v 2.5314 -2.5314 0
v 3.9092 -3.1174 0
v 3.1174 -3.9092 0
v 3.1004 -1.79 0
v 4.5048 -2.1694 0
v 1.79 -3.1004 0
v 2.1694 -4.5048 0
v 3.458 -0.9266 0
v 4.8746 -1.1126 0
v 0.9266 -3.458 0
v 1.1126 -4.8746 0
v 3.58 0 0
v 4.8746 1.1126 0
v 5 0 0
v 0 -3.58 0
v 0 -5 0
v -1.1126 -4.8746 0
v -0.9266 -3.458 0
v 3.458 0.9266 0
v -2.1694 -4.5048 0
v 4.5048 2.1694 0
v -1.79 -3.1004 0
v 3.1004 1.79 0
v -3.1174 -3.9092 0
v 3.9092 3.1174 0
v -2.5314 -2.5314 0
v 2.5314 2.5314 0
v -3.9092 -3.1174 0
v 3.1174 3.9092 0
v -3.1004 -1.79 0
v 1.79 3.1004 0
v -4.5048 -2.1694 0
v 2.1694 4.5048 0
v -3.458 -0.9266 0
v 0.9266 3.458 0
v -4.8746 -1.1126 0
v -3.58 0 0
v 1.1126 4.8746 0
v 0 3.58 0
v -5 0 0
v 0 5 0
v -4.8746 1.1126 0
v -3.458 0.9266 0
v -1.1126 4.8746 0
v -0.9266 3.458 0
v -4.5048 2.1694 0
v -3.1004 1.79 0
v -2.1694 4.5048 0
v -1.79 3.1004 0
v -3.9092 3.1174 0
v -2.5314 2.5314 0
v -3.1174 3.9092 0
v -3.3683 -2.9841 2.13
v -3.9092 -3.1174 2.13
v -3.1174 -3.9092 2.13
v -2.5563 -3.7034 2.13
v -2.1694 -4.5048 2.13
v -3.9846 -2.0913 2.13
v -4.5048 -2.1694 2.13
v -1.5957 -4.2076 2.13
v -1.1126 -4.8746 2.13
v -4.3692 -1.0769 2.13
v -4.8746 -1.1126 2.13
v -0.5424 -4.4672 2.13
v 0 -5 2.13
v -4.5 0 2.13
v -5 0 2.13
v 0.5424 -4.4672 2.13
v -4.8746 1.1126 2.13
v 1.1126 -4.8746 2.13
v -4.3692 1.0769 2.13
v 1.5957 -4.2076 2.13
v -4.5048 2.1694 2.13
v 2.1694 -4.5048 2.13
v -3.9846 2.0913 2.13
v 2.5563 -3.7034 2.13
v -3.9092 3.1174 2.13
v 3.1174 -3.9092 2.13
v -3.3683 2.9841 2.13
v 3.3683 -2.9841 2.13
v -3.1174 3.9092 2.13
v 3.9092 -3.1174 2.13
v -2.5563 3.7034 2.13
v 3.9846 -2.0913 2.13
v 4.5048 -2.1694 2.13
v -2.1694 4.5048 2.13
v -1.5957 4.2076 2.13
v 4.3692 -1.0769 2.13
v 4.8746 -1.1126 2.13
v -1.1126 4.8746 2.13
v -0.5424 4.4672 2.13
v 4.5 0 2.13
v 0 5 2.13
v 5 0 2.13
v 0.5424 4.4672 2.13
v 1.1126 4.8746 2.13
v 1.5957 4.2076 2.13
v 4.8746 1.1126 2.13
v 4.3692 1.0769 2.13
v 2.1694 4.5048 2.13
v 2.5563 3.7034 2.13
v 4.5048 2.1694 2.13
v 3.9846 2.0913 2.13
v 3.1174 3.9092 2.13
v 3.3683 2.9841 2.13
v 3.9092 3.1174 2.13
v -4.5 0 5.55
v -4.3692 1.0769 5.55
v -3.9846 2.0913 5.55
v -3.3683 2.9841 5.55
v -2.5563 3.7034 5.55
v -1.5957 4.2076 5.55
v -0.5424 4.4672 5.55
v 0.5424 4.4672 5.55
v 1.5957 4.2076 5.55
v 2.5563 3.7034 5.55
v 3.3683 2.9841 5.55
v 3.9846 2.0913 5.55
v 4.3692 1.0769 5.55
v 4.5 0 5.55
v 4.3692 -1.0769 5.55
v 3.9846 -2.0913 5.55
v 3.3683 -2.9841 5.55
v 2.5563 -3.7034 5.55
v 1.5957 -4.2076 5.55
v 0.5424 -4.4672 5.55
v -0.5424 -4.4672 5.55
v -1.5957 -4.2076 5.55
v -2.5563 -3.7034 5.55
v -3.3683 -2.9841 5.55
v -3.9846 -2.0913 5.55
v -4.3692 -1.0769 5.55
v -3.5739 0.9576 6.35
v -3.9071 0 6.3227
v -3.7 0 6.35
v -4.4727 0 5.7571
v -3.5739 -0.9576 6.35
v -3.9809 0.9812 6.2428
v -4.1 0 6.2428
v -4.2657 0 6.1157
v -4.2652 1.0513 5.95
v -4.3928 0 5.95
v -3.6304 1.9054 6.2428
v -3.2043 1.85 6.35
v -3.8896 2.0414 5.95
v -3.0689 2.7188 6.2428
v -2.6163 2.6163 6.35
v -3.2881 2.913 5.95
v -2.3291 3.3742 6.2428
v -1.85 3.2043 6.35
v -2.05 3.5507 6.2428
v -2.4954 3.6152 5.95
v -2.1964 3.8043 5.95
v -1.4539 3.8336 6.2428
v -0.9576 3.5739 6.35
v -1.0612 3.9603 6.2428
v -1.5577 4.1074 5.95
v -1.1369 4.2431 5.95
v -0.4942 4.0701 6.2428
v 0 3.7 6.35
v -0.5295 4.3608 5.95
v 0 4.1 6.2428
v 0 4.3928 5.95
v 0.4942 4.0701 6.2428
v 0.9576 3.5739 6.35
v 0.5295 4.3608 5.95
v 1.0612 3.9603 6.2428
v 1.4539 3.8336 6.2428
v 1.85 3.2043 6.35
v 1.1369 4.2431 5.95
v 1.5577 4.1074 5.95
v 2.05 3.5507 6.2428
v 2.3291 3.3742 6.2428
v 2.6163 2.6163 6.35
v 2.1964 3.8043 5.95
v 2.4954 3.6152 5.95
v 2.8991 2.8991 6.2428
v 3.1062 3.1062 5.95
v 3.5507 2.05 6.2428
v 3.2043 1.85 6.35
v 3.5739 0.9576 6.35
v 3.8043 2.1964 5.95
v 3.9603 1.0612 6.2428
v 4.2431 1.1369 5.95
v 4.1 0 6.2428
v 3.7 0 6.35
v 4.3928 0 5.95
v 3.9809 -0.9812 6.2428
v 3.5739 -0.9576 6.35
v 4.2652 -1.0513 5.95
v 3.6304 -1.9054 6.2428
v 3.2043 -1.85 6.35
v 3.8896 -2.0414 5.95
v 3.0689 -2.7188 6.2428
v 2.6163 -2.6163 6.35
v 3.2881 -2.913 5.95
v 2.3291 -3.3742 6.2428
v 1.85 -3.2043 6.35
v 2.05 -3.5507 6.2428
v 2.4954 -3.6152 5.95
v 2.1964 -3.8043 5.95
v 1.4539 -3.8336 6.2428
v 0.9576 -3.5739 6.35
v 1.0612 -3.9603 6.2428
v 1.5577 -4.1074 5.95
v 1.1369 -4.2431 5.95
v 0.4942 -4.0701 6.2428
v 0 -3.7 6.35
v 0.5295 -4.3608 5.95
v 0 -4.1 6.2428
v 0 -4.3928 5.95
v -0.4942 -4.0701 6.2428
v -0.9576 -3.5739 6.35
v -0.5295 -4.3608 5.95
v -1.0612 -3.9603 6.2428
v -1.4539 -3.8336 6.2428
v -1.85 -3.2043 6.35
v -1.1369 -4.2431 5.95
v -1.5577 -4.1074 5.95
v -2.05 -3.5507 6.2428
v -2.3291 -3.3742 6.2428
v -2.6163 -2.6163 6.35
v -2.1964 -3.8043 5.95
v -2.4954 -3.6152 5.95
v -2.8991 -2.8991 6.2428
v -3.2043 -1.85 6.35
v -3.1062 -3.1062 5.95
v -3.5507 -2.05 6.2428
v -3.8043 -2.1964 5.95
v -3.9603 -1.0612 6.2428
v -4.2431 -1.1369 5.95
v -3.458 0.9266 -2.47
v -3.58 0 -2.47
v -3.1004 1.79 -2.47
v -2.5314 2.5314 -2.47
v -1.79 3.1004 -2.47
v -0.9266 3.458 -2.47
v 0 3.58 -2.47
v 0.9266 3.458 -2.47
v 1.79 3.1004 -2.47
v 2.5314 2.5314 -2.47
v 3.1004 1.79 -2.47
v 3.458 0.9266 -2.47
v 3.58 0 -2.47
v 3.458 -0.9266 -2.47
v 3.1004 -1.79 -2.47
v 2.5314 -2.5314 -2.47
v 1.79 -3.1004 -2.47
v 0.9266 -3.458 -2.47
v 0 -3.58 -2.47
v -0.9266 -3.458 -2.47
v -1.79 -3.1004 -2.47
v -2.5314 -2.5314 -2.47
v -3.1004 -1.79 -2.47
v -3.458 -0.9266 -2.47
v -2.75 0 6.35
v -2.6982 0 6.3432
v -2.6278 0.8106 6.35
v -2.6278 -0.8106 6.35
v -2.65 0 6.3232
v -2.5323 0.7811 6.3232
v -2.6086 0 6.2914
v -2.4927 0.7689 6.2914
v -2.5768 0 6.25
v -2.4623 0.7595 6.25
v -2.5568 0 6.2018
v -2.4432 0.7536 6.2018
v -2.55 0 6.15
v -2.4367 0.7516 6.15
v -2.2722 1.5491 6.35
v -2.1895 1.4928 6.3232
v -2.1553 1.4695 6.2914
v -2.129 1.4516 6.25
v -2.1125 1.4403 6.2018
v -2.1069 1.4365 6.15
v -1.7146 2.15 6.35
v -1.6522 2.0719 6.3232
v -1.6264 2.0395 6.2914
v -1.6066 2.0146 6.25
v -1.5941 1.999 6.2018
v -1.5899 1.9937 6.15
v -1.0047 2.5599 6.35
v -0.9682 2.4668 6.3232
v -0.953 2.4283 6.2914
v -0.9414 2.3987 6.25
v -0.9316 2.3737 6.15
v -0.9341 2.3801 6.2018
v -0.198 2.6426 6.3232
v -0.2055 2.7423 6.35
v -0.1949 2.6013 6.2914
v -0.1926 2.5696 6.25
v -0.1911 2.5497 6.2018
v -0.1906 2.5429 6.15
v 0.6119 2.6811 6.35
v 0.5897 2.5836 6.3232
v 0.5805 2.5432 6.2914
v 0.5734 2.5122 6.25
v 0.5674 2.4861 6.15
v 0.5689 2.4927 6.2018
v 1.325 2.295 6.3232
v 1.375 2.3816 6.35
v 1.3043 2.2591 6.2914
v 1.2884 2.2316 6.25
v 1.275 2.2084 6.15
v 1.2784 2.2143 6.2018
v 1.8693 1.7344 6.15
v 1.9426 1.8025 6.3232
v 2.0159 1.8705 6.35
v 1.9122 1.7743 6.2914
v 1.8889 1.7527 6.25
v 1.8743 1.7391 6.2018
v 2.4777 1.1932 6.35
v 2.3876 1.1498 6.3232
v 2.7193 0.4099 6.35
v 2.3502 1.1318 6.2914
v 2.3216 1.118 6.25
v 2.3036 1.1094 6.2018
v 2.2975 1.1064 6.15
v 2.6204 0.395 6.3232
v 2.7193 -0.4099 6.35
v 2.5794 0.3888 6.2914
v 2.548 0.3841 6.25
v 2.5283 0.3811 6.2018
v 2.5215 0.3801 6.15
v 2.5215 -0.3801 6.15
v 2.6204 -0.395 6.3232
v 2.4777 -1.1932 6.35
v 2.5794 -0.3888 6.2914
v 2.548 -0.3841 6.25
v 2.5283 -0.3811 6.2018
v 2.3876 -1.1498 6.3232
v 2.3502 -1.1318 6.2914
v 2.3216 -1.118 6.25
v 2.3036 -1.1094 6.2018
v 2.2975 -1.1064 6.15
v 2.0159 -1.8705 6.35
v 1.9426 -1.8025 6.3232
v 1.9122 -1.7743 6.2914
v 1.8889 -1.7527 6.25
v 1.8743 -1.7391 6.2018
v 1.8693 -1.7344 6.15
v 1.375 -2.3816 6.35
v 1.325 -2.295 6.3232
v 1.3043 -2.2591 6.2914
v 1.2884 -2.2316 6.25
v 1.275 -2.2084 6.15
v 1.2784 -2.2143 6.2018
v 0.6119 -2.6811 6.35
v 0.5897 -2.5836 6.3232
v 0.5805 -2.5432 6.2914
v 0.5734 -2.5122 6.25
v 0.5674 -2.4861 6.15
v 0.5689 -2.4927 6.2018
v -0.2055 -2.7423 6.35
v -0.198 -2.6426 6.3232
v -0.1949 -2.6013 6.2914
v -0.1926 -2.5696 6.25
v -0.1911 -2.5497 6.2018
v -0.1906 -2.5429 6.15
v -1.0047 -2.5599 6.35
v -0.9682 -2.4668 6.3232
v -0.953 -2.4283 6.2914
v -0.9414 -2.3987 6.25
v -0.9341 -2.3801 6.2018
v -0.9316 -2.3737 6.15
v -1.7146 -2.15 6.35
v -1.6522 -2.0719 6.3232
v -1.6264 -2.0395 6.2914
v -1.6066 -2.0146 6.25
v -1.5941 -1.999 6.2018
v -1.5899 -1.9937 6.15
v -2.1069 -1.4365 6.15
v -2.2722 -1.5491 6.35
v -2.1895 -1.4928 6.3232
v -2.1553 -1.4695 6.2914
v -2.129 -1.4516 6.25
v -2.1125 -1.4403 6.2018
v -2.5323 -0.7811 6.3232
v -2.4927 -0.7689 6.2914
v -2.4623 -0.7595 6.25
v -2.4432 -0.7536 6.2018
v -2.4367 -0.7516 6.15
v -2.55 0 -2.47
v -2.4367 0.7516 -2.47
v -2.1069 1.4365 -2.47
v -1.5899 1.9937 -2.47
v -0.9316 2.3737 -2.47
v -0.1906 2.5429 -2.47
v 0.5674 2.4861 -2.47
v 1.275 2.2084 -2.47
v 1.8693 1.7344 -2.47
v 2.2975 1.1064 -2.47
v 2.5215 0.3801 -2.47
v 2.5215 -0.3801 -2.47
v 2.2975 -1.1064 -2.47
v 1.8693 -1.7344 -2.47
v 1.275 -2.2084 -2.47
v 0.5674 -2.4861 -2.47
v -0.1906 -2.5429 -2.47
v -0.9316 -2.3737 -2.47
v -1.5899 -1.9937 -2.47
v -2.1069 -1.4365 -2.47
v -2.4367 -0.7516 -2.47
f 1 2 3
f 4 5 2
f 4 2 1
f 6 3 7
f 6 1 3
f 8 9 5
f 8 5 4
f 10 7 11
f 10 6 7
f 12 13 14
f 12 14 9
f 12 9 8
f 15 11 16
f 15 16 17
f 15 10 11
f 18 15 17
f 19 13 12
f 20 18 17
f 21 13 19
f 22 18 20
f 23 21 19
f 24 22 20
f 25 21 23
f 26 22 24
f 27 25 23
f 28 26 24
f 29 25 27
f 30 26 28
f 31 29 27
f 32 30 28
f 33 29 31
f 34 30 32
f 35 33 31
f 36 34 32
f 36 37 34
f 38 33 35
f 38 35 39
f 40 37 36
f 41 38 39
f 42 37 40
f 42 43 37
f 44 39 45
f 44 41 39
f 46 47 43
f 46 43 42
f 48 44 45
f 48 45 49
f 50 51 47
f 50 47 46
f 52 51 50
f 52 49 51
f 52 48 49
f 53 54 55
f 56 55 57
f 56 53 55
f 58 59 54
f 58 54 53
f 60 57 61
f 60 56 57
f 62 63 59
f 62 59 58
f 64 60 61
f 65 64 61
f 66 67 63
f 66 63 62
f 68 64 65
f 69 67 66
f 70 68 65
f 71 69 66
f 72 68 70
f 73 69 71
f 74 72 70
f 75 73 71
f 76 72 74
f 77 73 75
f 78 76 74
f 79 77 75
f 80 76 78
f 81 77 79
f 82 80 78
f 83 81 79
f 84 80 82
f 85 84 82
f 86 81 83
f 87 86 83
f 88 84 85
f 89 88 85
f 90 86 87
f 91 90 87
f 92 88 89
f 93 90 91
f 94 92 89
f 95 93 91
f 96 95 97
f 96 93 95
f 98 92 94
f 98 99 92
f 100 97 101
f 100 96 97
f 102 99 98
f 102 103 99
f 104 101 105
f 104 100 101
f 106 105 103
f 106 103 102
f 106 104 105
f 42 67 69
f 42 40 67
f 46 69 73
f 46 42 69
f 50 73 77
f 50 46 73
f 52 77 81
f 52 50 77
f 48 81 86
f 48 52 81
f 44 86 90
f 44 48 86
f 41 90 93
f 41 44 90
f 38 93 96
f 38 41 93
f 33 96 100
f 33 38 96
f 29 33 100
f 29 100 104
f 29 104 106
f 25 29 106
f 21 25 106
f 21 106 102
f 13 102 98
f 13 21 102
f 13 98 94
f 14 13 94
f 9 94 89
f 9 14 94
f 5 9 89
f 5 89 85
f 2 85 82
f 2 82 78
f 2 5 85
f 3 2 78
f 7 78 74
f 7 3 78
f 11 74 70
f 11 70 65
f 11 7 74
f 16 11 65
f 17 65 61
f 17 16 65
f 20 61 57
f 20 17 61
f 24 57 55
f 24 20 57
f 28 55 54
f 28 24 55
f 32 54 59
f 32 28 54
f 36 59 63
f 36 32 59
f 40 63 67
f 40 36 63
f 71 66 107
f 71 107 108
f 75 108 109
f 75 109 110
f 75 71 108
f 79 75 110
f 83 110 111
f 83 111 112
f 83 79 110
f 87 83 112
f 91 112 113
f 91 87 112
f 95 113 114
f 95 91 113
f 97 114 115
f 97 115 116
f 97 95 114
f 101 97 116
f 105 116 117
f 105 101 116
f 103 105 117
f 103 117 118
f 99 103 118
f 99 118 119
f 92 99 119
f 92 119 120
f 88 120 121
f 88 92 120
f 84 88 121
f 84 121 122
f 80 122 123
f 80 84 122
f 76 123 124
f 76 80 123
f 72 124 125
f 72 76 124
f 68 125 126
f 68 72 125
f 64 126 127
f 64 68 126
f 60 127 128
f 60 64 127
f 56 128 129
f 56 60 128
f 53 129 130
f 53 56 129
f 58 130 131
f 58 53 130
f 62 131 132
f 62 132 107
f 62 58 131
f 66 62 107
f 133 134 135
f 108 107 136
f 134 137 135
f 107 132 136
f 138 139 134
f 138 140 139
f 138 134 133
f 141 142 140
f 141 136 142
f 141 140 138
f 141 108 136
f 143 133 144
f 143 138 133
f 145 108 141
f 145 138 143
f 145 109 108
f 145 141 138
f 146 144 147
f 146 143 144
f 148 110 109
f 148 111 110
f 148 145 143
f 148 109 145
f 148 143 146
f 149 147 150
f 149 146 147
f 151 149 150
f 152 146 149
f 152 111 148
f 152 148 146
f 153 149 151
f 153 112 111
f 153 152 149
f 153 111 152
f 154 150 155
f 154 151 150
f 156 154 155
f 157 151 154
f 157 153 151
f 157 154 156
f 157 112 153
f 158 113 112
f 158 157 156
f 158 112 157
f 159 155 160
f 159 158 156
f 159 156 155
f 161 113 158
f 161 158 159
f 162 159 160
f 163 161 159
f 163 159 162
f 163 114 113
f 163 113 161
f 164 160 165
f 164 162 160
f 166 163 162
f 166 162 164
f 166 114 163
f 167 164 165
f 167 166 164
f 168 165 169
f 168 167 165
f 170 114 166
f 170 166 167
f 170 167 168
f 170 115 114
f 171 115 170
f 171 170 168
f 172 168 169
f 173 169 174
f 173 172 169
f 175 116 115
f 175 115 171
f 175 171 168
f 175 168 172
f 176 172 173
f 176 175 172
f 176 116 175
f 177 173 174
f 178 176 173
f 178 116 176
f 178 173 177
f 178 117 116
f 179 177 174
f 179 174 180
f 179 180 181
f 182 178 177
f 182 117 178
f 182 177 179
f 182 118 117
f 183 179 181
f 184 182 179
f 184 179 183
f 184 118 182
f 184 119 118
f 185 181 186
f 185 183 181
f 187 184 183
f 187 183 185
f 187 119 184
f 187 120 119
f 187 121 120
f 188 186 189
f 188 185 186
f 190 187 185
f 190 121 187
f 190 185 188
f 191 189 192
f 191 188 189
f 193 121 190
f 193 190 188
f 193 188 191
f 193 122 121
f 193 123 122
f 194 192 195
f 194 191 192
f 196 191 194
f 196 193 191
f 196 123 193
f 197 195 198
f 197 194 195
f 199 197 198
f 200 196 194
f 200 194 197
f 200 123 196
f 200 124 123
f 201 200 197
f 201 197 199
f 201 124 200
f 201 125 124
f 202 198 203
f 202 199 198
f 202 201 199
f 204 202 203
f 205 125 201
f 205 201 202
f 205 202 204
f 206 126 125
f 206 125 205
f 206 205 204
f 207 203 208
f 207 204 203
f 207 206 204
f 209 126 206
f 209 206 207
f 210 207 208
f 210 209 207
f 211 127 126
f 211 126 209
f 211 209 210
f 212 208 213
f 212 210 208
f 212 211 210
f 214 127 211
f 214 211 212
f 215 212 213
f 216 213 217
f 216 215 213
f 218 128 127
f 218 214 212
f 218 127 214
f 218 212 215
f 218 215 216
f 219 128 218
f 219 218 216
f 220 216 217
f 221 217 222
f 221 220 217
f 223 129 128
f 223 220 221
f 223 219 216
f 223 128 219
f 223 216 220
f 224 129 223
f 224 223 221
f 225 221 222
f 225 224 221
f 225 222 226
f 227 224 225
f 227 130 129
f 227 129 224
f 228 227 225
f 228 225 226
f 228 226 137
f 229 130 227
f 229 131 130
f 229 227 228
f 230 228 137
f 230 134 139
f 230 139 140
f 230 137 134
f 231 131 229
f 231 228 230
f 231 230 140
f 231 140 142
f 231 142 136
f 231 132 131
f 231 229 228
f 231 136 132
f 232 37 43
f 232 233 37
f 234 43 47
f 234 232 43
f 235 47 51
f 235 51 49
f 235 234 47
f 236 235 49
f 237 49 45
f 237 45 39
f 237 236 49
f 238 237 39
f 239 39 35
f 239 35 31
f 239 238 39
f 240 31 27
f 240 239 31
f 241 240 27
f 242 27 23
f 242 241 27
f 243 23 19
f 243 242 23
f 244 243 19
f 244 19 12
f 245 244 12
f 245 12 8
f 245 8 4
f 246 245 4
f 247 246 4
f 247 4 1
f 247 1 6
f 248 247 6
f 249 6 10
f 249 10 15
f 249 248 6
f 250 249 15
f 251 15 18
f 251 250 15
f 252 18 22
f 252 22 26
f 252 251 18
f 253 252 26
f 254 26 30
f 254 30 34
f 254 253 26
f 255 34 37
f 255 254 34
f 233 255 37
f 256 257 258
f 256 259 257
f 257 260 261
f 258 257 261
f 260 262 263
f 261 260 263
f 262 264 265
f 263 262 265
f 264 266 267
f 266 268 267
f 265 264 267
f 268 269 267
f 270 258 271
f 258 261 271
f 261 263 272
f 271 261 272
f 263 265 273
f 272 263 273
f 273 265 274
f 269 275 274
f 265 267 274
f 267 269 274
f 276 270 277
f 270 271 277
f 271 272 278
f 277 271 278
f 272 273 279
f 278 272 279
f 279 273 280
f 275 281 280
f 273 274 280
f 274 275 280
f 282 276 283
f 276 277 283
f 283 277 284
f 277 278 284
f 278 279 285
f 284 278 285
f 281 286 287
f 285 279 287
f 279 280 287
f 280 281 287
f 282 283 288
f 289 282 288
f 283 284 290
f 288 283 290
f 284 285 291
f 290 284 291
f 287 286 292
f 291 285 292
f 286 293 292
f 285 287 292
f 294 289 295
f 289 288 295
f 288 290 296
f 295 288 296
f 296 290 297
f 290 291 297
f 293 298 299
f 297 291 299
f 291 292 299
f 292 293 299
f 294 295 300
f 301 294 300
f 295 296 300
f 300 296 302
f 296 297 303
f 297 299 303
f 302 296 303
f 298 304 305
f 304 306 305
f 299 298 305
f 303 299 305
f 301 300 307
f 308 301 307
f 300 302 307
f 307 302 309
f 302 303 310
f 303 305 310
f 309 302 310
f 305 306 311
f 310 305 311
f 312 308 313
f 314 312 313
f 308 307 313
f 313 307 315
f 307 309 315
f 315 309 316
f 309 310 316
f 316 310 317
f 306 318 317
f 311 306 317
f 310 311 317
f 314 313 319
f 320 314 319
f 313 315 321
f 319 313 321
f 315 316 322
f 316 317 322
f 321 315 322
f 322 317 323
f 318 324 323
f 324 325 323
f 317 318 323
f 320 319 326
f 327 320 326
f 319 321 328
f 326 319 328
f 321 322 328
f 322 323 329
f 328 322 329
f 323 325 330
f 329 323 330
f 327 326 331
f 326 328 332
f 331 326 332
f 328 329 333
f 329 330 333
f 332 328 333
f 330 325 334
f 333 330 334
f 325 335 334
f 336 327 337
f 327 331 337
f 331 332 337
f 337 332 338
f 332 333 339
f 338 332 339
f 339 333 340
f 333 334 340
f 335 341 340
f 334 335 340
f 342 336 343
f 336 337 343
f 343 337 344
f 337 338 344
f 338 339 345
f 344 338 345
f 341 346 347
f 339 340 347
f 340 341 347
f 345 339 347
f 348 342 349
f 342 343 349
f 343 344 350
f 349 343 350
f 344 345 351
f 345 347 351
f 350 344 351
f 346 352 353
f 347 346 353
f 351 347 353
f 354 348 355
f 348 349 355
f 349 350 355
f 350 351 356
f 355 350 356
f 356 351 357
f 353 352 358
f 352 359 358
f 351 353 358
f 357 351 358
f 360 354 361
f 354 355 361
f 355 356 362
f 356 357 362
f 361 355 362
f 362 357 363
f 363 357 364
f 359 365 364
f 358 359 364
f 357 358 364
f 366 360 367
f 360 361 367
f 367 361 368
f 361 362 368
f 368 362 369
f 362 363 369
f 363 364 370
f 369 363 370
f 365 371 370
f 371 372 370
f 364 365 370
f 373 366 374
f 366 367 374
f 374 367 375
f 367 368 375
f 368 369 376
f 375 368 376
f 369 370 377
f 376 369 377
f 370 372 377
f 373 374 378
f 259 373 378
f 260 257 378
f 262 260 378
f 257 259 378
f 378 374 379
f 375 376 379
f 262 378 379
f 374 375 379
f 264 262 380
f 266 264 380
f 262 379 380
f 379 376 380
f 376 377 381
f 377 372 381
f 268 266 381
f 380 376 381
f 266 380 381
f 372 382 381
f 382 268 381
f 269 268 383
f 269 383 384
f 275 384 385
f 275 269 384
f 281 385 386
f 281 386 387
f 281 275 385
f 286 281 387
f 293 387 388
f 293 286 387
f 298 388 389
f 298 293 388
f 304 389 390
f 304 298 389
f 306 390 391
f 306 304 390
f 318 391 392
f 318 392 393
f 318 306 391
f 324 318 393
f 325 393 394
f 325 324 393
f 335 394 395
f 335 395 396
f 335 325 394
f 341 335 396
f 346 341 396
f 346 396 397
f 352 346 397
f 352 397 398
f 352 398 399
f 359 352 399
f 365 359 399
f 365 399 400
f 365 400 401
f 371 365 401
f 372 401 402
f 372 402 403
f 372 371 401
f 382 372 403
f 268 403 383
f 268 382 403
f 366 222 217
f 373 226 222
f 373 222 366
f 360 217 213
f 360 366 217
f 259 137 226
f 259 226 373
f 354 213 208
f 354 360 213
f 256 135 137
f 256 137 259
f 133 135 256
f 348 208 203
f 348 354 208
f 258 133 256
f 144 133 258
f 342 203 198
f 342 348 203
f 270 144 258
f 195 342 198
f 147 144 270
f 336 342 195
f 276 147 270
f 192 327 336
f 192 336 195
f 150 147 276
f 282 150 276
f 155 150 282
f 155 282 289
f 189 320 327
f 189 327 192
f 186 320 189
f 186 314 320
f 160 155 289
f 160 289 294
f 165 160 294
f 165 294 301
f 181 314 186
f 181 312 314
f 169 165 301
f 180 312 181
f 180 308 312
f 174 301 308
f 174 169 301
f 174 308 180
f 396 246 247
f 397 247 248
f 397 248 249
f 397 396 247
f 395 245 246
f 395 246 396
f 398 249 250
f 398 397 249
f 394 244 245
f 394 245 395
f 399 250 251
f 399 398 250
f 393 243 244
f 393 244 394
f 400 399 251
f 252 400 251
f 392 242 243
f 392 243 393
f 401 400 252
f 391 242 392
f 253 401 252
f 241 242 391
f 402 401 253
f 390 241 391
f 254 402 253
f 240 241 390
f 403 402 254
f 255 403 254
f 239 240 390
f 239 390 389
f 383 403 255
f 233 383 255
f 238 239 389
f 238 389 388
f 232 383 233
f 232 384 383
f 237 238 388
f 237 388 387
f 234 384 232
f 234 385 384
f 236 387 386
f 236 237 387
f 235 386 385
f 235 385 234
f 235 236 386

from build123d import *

# Parameters (mm, degrees)
F2_R = 0.8
F3_R = 0.2


with BuildPart() as f1:
    # F0 (on Front) → F1 (revolve)
    with BuildSketch(Plane.XZ):
        Polygon((-2.55, -2.47), (-2.55, 6.35), (-4.5, 6.35), (-4.5, 2.13), (-5, 2.13), (-5, 0), (-3.58, 0), (-3.58, -2.47), align=None)
    revolve(axis=Axis((0, 0, -0.888866), (0, 0, -1)))

    # F2
    f2_edges = [f1.edges().sort_by_distance(p)[0] for p in [
        (4.5, 0, 6.35),
    ]]
    fillet(f2_edges, radius=F2_R)

    # F3
    f3_edges = [f1.edges().sort_by_distance(p)[0] for p in [
        (2.55, 0, 6.35),
    ]]
    fillet(f3_edges, radius=F3_R)


solid = f1.part
